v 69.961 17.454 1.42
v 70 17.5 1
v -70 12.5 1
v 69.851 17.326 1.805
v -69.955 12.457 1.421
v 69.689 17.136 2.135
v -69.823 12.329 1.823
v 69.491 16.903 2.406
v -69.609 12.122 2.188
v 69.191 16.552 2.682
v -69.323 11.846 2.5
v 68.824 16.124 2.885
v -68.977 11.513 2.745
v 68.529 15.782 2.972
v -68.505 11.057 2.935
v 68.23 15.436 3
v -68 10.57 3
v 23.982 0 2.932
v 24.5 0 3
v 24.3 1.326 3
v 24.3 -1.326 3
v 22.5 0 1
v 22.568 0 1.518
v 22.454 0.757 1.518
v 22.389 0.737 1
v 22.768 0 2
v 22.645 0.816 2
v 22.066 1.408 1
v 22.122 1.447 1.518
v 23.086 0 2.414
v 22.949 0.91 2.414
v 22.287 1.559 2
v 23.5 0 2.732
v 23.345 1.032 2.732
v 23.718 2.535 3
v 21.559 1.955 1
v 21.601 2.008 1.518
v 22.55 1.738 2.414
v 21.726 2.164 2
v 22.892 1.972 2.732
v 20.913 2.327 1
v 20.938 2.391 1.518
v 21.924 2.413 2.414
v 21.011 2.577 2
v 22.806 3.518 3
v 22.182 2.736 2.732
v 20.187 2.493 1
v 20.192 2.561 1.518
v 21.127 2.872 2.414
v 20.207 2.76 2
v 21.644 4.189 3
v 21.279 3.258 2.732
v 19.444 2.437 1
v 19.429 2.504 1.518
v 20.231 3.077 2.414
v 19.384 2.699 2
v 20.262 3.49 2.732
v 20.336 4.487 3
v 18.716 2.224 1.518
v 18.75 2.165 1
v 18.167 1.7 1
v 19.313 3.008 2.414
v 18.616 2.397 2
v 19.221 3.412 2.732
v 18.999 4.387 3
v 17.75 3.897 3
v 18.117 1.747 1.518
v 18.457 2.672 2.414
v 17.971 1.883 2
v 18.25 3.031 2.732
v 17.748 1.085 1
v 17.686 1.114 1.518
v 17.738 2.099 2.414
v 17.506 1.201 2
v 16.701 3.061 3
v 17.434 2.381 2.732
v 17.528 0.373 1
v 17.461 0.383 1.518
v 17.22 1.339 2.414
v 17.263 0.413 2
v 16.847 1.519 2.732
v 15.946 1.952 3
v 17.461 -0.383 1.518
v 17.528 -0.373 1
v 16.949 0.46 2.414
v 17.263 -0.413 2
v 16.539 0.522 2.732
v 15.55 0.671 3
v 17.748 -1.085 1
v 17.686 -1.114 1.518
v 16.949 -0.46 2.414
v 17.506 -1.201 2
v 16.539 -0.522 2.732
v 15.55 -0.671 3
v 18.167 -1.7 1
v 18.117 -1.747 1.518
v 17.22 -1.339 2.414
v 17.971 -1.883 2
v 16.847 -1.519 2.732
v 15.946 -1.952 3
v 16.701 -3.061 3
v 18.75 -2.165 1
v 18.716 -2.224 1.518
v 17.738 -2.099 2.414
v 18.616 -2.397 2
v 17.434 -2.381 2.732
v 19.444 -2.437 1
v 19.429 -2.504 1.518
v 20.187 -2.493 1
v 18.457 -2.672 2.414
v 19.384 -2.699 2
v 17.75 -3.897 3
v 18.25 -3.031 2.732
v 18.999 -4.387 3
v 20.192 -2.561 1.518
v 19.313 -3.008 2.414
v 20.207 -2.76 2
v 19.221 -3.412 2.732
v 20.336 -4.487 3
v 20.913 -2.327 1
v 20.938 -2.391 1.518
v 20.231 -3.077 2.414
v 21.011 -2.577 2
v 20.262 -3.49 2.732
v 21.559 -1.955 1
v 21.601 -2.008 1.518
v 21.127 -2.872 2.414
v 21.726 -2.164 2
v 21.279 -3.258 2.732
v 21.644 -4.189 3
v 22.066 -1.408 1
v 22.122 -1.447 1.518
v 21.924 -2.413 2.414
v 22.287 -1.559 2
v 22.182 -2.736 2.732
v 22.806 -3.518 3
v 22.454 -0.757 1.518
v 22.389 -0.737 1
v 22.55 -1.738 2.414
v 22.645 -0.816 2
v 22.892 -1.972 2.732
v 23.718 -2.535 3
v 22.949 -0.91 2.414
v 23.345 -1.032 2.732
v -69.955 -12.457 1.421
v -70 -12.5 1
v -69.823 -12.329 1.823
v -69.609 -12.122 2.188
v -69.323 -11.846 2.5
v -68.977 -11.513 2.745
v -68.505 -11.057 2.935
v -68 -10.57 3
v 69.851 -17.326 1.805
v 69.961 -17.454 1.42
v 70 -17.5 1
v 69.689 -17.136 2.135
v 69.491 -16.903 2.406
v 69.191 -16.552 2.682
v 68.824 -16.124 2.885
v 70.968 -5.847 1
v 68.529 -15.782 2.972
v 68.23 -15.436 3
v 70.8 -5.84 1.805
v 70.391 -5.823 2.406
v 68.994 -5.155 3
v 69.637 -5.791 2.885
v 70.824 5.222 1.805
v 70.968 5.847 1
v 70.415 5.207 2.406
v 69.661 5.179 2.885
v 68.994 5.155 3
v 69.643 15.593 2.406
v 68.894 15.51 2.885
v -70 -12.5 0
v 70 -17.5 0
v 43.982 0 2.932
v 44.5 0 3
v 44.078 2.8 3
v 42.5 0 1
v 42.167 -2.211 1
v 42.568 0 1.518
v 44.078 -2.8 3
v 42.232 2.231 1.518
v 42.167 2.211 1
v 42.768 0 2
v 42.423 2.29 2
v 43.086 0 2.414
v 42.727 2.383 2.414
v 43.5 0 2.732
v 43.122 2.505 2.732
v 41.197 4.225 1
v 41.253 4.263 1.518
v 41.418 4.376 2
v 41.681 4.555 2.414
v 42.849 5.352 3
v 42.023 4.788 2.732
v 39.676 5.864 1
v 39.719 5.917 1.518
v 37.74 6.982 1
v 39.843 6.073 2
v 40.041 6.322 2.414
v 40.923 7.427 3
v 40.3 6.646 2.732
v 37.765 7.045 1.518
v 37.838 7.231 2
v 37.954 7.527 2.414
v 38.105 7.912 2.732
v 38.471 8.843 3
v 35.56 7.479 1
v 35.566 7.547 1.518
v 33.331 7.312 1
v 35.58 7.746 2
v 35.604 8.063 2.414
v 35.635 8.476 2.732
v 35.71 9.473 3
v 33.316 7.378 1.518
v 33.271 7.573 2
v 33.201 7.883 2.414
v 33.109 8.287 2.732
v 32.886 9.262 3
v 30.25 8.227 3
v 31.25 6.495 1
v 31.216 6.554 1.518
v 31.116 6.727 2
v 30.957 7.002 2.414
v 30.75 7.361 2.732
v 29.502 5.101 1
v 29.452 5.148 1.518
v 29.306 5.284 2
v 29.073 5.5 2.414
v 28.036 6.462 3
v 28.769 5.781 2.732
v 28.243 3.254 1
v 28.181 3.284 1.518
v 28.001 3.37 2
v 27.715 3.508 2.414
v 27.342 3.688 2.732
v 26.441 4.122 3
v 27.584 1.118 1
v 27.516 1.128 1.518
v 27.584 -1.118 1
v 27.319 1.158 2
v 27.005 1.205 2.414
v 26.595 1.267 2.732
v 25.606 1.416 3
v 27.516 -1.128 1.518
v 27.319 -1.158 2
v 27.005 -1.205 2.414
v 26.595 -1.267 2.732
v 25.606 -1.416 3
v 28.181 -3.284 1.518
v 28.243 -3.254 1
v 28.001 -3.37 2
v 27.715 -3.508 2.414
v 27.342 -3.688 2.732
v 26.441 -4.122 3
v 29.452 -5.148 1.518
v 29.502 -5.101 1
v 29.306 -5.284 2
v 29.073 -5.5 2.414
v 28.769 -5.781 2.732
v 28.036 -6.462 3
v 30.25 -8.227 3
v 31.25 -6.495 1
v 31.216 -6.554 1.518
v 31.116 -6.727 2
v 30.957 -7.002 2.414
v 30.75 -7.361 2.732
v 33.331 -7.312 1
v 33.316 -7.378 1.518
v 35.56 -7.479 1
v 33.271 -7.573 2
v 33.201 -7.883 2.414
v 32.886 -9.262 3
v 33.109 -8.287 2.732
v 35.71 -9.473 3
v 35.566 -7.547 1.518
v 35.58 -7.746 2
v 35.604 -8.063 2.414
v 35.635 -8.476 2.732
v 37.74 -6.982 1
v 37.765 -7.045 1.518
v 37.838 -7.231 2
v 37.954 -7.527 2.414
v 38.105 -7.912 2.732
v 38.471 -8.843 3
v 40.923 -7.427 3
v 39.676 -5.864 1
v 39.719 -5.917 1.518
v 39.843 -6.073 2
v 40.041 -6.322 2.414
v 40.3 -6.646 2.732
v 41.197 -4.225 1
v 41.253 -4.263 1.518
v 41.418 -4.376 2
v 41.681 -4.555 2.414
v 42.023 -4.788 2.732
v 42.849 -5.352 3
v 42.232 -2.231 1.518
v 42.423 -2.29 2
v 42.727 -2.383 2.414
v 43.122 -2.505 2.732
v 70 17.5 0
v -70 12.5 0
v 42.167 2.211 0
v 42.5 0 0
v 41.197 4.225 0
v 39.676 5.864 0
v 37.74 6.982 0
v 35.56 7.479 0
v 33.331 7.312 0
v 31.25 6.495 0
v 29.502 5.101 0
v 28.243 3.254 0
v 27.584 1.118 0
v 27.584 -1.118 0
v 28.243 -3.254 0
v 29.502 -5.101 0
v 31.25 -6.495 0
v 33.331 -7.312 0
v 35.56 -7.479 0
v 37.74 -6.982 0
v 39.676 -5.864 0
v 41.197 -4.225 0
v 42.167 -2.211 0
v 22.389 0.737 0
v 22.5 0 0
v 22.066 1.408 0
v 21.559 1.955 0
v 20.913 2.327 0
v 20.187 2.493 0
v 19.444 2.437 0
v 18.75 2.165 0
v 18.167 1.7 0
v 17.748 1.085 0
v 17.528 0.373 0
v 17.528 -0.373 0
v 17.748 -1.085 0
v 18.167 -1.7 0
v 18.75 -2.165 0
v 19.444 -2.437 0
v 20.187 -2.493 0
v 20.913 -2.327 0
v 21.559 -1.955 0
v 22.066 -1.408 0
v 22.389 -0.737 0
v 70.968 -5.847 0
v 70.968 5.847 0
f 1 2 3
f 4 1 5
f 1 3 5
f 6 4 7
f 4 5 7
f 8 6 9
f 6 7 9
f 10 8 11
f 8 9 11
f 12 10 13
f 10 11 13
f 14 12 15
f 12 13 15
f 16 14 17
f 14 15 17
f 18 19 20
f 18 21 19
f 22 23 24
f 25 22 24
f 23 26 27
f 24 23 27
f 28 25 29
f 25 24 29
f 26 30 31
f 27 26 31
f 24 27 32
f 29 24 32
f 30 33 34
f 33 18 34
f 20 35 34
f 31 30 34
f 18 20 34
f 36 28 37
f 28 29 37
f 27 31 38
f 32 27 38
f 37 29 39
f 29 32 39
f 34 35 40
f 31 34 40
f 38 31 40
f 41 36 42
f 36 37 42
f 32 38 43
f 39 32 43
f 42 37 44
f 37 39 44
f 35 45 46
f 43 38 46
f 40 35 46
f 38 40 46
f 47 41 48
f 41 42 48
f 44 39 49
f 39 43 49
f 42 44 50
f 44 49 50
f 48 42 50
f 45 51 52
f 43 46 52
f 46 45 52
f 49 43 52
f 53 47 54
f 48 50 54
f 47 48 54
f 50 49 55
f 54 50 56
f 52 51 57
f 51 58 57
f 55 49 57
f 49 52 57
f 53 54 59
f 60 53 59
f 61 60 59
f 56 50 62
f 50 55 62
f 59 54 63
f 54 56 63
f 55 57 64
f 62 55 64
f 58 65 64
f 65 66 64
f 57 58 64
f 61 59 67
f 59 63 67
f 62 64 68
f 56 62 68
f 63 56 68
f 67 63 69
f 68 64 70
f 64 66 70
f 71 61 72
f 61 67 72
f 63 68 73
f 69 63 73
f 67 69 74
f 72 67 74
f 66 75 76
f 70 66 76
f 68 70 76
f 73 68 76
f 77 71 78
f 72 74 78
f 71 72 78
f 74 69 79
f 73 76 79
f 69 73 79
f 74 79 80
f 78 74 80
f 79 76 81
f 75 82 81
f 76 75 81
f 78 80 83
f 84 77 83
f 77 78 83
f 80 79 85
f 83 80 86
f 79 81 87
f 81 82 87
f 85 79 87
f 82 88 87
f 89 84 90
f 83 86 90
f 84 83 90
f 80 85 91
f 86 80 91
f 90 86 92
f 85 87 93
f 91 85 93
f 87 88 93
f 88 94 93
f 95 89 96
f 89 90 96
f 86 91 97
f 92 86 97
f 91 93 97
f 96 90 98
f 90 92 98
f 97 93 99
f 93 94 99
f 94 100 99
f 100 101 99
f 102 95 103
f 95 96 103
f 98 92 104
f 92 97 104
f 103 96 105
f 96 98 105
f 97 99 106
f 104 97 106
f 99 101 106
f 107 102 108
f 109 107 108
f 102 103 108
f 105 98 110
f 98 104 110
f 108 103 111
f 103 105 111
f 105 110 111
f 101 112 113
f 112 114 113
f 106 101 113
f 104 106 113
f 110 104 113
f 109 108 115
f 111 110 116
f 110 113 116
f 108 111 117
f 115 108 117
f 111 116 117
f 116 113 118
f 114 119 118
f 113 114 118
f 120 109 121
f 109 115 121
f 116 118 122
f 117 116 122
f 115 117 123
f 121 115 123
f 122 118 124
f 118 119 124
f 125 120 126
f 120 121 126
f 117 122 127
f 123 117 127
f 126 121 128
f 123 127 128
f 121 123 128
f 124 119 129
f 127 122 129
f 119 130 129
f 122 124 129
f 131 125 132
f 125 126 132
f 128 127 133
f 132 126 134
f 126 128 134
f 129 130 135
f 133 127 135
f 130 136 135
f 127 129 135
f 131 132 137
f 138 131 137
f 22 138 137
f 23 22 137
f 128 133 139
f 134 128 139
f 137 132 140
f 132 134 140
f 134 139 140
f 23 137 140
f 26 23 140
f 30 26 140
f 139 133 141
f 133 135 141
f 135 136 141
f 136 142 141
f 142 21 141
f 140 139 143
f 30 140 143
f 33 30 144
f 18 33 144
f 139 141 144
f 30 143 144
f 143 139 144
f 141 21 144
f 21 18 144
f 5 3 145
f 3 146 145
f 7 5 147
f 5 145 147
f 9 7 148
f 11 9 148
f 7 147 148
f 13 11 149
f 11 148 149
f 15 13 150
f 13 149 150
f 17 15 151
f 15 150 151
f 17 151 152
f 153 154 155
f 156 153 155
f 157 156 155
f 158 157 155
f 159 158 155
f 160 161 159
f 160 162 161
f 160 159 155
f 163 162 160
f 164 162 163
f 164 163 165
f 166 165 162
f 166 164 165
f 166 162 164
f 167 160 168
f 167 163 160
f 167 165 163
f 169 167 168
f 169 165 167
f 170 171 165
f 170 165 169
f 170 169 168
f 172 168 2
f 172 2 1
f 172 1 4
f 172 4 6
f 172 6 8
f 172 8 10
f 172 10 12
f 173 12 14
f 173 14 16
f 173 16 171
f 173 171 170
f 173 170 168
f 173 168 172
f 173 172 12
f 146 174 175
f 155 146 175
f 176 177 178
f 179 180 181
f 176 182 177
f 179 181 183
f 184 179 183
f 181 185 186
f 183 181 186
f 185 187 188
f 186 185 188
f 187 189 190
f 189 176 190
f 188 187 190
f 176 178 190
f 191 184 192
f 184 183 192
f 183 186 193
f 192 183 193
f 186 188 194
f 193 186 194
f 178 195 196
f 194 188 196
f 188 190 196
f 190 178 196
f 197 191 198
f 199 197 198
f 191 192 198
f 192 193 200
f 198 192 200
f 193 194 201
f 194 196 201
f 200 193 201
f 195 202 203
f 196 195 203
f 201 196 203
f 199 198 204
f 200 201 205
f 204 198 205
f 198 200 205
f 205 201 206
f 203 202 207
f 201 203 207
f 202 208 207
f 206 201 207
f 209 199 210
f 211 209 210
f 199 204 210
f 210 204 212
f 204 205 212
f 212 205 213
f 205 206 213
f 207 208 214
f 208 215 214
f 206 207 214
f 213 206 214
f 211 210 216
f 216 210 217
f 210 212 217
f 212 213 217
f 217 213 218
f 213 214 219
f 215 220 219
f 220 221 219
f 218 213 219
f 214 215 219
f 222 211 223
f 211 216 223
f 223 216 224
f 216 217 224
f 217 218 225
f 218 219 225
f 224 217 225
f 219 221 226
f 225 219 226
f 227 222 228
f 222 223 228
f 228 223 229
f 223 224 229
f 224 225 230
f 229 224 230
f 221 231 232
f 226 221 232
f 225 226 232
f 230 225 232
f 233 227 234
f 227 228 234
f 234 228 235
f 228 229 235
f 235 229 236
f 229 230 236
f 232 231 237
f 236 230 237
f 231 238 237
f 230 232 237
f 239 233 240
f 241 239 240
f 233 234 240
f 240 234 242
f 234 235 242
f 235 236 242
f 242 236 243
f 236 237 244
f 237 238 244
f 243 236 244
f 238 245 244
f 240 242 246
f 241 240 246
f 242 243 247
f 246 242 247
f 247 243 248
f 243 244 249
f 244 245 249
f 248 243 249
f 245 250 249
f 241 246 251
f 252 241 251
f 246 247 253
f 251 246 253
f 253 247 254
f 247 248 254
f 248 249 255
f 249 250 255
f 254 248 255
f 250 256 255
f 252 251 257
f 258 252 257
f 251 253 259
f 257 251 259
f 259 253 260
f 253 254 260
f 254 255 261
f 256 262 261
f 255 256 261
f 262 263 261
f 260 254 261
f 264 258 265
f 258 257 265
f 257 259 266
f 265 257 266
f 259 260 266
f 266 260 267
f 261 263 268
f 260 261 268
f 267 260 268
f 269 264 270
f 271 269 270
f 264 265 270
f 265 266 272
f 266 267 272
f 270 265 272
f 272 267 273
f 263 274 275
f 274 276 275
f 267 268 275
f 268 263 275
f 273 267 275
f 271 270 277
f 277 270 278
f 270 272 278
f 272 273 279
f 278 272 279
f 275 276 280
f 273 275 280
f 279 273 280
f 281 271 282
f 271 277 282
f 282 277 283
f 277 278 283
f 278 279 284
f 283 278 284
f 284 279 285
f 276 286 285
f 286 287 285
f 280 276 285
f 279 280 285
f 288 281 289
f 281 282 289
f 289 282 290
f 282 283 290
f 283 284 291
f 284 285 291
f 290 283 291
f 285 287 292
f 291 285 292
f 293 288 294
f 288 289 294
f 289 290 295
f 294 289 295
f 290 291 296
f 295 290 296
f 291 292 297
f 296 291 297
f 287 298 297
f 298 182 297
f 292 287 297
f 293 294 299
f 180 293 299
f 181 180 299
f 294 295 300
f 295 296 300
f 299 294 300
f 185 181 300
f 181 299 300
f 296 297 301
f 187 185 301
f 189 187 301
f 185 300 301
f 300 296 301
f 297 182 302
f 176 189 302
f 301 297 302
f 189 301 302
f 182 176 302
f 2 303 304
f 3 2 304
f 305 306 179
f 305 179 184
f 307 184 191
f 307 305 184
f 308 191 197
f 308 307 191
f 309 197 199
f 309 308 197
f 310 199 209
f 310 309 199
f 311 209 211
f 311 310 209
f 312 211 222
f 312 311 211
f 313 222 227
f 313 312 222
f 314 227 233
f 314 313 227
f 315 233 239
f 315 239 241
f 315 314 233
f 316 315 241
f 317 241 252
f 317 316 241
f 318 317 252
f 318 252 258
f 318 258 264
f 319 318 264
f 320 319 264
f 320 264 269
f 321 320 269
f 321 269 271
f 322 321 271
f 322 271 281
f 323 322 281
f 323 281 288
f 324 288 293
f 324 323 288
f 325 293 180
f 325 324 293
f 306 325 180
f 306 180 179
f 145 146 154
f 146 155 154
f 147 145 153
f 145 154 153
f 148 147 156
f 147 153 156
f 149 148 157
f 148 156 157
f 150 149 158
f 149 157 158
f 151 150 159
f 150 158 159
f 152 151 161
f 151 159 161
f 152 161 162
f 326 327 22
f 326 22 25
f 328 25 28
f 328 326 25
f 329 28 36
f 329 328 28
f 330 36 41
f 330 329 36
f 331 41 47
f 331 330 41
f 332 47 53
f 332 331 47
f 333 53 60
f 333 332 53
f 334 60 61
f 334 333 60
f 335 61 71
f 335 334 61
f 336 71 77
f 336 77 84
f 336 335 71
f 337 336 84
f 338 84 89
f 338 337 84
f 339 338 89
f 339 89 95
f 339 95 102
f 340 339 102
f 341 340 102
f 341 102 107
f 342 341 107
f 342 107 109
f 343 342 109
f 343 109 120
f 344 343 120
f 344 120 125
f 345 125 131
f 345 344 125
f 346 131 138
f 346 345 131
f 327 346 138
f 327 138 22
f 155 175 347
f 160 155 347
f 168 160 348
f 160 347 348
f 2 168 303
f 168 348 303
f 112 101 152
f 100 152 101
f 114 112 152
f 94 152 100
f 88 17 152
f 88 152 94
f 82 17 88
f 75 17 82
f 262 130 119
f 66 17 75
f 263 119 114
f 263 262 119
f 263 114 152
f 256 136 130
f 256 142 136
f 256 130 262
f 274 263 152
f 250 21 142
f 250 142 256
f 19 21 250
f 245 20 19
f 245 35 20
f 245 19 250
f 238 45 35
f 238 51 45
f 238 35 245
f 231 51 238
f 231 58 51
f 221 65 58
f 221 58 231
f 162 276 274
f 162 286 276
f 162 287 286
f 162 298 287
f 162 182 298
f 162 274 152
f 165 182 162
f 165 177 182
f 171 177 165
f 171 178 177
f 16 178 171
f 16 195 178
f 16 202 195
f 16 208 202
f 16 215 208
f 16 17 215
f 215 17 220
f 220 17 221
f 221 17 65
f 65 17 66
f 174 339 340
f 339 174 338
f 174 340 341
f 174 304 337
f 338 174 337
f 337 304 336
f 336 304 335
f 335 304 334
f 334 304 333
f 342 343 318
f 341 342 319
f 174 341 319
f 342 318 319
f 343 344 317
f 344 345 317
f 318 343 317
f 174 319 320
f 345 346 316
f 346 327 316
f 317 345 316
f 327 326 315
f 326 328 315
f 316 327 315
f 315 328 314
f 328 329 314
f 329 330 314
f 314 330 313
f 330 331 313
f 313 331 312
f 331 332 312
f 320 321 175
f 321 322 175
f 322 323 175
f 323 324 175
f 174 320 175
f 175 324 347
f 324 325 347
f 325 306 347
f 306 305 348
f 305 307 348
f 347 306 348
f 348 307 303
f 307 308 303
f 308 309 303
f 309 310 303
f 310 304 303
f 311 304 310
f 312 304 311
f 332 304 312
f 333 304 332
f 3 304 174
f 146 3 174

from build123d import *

# Parameters (mm, degrees)
F0_R     = 2.5
F0_R_2   = 7.5
F1_DEPTH = 3
F2_R     = 2


with BuildPart() as f1:
    # F0 (on Top) → F1 (new body)
    with BuildSketch(Plane.XY):
        with BuildLine():
            Line((70, 17.5), (-70, 12.5))
            Line((-70, 12.5), (-70, -12.5))
            Line((-70, -12.5), (70, -17.5))
            ThreePointArc((70, -17.5), (71.089511, 0), (70, 17.5))
        make_face()
        with Locations((20, 0)):
            Circle(F0_R, mode=Mode.SUBTRACT)
        with Locations((35, 0)):
            Circle(F0_R_2, mode=Mode.SUBTRACT)
    extrude(amount=F1_DEPTH)

    # F2
    f2_edges = [f1.edges().sort_by_distance(p)[0] for p in [
        (0, 15, 3),
        (-70, 0, 3),
        (0, -15, 3),
        (71.089511, 0, 3),
        (17.5, 0, 3),
        (27.5, 0, 3),
    ]]
    fillet(f2_edges, radius=F2_R)


solid = f1.part
